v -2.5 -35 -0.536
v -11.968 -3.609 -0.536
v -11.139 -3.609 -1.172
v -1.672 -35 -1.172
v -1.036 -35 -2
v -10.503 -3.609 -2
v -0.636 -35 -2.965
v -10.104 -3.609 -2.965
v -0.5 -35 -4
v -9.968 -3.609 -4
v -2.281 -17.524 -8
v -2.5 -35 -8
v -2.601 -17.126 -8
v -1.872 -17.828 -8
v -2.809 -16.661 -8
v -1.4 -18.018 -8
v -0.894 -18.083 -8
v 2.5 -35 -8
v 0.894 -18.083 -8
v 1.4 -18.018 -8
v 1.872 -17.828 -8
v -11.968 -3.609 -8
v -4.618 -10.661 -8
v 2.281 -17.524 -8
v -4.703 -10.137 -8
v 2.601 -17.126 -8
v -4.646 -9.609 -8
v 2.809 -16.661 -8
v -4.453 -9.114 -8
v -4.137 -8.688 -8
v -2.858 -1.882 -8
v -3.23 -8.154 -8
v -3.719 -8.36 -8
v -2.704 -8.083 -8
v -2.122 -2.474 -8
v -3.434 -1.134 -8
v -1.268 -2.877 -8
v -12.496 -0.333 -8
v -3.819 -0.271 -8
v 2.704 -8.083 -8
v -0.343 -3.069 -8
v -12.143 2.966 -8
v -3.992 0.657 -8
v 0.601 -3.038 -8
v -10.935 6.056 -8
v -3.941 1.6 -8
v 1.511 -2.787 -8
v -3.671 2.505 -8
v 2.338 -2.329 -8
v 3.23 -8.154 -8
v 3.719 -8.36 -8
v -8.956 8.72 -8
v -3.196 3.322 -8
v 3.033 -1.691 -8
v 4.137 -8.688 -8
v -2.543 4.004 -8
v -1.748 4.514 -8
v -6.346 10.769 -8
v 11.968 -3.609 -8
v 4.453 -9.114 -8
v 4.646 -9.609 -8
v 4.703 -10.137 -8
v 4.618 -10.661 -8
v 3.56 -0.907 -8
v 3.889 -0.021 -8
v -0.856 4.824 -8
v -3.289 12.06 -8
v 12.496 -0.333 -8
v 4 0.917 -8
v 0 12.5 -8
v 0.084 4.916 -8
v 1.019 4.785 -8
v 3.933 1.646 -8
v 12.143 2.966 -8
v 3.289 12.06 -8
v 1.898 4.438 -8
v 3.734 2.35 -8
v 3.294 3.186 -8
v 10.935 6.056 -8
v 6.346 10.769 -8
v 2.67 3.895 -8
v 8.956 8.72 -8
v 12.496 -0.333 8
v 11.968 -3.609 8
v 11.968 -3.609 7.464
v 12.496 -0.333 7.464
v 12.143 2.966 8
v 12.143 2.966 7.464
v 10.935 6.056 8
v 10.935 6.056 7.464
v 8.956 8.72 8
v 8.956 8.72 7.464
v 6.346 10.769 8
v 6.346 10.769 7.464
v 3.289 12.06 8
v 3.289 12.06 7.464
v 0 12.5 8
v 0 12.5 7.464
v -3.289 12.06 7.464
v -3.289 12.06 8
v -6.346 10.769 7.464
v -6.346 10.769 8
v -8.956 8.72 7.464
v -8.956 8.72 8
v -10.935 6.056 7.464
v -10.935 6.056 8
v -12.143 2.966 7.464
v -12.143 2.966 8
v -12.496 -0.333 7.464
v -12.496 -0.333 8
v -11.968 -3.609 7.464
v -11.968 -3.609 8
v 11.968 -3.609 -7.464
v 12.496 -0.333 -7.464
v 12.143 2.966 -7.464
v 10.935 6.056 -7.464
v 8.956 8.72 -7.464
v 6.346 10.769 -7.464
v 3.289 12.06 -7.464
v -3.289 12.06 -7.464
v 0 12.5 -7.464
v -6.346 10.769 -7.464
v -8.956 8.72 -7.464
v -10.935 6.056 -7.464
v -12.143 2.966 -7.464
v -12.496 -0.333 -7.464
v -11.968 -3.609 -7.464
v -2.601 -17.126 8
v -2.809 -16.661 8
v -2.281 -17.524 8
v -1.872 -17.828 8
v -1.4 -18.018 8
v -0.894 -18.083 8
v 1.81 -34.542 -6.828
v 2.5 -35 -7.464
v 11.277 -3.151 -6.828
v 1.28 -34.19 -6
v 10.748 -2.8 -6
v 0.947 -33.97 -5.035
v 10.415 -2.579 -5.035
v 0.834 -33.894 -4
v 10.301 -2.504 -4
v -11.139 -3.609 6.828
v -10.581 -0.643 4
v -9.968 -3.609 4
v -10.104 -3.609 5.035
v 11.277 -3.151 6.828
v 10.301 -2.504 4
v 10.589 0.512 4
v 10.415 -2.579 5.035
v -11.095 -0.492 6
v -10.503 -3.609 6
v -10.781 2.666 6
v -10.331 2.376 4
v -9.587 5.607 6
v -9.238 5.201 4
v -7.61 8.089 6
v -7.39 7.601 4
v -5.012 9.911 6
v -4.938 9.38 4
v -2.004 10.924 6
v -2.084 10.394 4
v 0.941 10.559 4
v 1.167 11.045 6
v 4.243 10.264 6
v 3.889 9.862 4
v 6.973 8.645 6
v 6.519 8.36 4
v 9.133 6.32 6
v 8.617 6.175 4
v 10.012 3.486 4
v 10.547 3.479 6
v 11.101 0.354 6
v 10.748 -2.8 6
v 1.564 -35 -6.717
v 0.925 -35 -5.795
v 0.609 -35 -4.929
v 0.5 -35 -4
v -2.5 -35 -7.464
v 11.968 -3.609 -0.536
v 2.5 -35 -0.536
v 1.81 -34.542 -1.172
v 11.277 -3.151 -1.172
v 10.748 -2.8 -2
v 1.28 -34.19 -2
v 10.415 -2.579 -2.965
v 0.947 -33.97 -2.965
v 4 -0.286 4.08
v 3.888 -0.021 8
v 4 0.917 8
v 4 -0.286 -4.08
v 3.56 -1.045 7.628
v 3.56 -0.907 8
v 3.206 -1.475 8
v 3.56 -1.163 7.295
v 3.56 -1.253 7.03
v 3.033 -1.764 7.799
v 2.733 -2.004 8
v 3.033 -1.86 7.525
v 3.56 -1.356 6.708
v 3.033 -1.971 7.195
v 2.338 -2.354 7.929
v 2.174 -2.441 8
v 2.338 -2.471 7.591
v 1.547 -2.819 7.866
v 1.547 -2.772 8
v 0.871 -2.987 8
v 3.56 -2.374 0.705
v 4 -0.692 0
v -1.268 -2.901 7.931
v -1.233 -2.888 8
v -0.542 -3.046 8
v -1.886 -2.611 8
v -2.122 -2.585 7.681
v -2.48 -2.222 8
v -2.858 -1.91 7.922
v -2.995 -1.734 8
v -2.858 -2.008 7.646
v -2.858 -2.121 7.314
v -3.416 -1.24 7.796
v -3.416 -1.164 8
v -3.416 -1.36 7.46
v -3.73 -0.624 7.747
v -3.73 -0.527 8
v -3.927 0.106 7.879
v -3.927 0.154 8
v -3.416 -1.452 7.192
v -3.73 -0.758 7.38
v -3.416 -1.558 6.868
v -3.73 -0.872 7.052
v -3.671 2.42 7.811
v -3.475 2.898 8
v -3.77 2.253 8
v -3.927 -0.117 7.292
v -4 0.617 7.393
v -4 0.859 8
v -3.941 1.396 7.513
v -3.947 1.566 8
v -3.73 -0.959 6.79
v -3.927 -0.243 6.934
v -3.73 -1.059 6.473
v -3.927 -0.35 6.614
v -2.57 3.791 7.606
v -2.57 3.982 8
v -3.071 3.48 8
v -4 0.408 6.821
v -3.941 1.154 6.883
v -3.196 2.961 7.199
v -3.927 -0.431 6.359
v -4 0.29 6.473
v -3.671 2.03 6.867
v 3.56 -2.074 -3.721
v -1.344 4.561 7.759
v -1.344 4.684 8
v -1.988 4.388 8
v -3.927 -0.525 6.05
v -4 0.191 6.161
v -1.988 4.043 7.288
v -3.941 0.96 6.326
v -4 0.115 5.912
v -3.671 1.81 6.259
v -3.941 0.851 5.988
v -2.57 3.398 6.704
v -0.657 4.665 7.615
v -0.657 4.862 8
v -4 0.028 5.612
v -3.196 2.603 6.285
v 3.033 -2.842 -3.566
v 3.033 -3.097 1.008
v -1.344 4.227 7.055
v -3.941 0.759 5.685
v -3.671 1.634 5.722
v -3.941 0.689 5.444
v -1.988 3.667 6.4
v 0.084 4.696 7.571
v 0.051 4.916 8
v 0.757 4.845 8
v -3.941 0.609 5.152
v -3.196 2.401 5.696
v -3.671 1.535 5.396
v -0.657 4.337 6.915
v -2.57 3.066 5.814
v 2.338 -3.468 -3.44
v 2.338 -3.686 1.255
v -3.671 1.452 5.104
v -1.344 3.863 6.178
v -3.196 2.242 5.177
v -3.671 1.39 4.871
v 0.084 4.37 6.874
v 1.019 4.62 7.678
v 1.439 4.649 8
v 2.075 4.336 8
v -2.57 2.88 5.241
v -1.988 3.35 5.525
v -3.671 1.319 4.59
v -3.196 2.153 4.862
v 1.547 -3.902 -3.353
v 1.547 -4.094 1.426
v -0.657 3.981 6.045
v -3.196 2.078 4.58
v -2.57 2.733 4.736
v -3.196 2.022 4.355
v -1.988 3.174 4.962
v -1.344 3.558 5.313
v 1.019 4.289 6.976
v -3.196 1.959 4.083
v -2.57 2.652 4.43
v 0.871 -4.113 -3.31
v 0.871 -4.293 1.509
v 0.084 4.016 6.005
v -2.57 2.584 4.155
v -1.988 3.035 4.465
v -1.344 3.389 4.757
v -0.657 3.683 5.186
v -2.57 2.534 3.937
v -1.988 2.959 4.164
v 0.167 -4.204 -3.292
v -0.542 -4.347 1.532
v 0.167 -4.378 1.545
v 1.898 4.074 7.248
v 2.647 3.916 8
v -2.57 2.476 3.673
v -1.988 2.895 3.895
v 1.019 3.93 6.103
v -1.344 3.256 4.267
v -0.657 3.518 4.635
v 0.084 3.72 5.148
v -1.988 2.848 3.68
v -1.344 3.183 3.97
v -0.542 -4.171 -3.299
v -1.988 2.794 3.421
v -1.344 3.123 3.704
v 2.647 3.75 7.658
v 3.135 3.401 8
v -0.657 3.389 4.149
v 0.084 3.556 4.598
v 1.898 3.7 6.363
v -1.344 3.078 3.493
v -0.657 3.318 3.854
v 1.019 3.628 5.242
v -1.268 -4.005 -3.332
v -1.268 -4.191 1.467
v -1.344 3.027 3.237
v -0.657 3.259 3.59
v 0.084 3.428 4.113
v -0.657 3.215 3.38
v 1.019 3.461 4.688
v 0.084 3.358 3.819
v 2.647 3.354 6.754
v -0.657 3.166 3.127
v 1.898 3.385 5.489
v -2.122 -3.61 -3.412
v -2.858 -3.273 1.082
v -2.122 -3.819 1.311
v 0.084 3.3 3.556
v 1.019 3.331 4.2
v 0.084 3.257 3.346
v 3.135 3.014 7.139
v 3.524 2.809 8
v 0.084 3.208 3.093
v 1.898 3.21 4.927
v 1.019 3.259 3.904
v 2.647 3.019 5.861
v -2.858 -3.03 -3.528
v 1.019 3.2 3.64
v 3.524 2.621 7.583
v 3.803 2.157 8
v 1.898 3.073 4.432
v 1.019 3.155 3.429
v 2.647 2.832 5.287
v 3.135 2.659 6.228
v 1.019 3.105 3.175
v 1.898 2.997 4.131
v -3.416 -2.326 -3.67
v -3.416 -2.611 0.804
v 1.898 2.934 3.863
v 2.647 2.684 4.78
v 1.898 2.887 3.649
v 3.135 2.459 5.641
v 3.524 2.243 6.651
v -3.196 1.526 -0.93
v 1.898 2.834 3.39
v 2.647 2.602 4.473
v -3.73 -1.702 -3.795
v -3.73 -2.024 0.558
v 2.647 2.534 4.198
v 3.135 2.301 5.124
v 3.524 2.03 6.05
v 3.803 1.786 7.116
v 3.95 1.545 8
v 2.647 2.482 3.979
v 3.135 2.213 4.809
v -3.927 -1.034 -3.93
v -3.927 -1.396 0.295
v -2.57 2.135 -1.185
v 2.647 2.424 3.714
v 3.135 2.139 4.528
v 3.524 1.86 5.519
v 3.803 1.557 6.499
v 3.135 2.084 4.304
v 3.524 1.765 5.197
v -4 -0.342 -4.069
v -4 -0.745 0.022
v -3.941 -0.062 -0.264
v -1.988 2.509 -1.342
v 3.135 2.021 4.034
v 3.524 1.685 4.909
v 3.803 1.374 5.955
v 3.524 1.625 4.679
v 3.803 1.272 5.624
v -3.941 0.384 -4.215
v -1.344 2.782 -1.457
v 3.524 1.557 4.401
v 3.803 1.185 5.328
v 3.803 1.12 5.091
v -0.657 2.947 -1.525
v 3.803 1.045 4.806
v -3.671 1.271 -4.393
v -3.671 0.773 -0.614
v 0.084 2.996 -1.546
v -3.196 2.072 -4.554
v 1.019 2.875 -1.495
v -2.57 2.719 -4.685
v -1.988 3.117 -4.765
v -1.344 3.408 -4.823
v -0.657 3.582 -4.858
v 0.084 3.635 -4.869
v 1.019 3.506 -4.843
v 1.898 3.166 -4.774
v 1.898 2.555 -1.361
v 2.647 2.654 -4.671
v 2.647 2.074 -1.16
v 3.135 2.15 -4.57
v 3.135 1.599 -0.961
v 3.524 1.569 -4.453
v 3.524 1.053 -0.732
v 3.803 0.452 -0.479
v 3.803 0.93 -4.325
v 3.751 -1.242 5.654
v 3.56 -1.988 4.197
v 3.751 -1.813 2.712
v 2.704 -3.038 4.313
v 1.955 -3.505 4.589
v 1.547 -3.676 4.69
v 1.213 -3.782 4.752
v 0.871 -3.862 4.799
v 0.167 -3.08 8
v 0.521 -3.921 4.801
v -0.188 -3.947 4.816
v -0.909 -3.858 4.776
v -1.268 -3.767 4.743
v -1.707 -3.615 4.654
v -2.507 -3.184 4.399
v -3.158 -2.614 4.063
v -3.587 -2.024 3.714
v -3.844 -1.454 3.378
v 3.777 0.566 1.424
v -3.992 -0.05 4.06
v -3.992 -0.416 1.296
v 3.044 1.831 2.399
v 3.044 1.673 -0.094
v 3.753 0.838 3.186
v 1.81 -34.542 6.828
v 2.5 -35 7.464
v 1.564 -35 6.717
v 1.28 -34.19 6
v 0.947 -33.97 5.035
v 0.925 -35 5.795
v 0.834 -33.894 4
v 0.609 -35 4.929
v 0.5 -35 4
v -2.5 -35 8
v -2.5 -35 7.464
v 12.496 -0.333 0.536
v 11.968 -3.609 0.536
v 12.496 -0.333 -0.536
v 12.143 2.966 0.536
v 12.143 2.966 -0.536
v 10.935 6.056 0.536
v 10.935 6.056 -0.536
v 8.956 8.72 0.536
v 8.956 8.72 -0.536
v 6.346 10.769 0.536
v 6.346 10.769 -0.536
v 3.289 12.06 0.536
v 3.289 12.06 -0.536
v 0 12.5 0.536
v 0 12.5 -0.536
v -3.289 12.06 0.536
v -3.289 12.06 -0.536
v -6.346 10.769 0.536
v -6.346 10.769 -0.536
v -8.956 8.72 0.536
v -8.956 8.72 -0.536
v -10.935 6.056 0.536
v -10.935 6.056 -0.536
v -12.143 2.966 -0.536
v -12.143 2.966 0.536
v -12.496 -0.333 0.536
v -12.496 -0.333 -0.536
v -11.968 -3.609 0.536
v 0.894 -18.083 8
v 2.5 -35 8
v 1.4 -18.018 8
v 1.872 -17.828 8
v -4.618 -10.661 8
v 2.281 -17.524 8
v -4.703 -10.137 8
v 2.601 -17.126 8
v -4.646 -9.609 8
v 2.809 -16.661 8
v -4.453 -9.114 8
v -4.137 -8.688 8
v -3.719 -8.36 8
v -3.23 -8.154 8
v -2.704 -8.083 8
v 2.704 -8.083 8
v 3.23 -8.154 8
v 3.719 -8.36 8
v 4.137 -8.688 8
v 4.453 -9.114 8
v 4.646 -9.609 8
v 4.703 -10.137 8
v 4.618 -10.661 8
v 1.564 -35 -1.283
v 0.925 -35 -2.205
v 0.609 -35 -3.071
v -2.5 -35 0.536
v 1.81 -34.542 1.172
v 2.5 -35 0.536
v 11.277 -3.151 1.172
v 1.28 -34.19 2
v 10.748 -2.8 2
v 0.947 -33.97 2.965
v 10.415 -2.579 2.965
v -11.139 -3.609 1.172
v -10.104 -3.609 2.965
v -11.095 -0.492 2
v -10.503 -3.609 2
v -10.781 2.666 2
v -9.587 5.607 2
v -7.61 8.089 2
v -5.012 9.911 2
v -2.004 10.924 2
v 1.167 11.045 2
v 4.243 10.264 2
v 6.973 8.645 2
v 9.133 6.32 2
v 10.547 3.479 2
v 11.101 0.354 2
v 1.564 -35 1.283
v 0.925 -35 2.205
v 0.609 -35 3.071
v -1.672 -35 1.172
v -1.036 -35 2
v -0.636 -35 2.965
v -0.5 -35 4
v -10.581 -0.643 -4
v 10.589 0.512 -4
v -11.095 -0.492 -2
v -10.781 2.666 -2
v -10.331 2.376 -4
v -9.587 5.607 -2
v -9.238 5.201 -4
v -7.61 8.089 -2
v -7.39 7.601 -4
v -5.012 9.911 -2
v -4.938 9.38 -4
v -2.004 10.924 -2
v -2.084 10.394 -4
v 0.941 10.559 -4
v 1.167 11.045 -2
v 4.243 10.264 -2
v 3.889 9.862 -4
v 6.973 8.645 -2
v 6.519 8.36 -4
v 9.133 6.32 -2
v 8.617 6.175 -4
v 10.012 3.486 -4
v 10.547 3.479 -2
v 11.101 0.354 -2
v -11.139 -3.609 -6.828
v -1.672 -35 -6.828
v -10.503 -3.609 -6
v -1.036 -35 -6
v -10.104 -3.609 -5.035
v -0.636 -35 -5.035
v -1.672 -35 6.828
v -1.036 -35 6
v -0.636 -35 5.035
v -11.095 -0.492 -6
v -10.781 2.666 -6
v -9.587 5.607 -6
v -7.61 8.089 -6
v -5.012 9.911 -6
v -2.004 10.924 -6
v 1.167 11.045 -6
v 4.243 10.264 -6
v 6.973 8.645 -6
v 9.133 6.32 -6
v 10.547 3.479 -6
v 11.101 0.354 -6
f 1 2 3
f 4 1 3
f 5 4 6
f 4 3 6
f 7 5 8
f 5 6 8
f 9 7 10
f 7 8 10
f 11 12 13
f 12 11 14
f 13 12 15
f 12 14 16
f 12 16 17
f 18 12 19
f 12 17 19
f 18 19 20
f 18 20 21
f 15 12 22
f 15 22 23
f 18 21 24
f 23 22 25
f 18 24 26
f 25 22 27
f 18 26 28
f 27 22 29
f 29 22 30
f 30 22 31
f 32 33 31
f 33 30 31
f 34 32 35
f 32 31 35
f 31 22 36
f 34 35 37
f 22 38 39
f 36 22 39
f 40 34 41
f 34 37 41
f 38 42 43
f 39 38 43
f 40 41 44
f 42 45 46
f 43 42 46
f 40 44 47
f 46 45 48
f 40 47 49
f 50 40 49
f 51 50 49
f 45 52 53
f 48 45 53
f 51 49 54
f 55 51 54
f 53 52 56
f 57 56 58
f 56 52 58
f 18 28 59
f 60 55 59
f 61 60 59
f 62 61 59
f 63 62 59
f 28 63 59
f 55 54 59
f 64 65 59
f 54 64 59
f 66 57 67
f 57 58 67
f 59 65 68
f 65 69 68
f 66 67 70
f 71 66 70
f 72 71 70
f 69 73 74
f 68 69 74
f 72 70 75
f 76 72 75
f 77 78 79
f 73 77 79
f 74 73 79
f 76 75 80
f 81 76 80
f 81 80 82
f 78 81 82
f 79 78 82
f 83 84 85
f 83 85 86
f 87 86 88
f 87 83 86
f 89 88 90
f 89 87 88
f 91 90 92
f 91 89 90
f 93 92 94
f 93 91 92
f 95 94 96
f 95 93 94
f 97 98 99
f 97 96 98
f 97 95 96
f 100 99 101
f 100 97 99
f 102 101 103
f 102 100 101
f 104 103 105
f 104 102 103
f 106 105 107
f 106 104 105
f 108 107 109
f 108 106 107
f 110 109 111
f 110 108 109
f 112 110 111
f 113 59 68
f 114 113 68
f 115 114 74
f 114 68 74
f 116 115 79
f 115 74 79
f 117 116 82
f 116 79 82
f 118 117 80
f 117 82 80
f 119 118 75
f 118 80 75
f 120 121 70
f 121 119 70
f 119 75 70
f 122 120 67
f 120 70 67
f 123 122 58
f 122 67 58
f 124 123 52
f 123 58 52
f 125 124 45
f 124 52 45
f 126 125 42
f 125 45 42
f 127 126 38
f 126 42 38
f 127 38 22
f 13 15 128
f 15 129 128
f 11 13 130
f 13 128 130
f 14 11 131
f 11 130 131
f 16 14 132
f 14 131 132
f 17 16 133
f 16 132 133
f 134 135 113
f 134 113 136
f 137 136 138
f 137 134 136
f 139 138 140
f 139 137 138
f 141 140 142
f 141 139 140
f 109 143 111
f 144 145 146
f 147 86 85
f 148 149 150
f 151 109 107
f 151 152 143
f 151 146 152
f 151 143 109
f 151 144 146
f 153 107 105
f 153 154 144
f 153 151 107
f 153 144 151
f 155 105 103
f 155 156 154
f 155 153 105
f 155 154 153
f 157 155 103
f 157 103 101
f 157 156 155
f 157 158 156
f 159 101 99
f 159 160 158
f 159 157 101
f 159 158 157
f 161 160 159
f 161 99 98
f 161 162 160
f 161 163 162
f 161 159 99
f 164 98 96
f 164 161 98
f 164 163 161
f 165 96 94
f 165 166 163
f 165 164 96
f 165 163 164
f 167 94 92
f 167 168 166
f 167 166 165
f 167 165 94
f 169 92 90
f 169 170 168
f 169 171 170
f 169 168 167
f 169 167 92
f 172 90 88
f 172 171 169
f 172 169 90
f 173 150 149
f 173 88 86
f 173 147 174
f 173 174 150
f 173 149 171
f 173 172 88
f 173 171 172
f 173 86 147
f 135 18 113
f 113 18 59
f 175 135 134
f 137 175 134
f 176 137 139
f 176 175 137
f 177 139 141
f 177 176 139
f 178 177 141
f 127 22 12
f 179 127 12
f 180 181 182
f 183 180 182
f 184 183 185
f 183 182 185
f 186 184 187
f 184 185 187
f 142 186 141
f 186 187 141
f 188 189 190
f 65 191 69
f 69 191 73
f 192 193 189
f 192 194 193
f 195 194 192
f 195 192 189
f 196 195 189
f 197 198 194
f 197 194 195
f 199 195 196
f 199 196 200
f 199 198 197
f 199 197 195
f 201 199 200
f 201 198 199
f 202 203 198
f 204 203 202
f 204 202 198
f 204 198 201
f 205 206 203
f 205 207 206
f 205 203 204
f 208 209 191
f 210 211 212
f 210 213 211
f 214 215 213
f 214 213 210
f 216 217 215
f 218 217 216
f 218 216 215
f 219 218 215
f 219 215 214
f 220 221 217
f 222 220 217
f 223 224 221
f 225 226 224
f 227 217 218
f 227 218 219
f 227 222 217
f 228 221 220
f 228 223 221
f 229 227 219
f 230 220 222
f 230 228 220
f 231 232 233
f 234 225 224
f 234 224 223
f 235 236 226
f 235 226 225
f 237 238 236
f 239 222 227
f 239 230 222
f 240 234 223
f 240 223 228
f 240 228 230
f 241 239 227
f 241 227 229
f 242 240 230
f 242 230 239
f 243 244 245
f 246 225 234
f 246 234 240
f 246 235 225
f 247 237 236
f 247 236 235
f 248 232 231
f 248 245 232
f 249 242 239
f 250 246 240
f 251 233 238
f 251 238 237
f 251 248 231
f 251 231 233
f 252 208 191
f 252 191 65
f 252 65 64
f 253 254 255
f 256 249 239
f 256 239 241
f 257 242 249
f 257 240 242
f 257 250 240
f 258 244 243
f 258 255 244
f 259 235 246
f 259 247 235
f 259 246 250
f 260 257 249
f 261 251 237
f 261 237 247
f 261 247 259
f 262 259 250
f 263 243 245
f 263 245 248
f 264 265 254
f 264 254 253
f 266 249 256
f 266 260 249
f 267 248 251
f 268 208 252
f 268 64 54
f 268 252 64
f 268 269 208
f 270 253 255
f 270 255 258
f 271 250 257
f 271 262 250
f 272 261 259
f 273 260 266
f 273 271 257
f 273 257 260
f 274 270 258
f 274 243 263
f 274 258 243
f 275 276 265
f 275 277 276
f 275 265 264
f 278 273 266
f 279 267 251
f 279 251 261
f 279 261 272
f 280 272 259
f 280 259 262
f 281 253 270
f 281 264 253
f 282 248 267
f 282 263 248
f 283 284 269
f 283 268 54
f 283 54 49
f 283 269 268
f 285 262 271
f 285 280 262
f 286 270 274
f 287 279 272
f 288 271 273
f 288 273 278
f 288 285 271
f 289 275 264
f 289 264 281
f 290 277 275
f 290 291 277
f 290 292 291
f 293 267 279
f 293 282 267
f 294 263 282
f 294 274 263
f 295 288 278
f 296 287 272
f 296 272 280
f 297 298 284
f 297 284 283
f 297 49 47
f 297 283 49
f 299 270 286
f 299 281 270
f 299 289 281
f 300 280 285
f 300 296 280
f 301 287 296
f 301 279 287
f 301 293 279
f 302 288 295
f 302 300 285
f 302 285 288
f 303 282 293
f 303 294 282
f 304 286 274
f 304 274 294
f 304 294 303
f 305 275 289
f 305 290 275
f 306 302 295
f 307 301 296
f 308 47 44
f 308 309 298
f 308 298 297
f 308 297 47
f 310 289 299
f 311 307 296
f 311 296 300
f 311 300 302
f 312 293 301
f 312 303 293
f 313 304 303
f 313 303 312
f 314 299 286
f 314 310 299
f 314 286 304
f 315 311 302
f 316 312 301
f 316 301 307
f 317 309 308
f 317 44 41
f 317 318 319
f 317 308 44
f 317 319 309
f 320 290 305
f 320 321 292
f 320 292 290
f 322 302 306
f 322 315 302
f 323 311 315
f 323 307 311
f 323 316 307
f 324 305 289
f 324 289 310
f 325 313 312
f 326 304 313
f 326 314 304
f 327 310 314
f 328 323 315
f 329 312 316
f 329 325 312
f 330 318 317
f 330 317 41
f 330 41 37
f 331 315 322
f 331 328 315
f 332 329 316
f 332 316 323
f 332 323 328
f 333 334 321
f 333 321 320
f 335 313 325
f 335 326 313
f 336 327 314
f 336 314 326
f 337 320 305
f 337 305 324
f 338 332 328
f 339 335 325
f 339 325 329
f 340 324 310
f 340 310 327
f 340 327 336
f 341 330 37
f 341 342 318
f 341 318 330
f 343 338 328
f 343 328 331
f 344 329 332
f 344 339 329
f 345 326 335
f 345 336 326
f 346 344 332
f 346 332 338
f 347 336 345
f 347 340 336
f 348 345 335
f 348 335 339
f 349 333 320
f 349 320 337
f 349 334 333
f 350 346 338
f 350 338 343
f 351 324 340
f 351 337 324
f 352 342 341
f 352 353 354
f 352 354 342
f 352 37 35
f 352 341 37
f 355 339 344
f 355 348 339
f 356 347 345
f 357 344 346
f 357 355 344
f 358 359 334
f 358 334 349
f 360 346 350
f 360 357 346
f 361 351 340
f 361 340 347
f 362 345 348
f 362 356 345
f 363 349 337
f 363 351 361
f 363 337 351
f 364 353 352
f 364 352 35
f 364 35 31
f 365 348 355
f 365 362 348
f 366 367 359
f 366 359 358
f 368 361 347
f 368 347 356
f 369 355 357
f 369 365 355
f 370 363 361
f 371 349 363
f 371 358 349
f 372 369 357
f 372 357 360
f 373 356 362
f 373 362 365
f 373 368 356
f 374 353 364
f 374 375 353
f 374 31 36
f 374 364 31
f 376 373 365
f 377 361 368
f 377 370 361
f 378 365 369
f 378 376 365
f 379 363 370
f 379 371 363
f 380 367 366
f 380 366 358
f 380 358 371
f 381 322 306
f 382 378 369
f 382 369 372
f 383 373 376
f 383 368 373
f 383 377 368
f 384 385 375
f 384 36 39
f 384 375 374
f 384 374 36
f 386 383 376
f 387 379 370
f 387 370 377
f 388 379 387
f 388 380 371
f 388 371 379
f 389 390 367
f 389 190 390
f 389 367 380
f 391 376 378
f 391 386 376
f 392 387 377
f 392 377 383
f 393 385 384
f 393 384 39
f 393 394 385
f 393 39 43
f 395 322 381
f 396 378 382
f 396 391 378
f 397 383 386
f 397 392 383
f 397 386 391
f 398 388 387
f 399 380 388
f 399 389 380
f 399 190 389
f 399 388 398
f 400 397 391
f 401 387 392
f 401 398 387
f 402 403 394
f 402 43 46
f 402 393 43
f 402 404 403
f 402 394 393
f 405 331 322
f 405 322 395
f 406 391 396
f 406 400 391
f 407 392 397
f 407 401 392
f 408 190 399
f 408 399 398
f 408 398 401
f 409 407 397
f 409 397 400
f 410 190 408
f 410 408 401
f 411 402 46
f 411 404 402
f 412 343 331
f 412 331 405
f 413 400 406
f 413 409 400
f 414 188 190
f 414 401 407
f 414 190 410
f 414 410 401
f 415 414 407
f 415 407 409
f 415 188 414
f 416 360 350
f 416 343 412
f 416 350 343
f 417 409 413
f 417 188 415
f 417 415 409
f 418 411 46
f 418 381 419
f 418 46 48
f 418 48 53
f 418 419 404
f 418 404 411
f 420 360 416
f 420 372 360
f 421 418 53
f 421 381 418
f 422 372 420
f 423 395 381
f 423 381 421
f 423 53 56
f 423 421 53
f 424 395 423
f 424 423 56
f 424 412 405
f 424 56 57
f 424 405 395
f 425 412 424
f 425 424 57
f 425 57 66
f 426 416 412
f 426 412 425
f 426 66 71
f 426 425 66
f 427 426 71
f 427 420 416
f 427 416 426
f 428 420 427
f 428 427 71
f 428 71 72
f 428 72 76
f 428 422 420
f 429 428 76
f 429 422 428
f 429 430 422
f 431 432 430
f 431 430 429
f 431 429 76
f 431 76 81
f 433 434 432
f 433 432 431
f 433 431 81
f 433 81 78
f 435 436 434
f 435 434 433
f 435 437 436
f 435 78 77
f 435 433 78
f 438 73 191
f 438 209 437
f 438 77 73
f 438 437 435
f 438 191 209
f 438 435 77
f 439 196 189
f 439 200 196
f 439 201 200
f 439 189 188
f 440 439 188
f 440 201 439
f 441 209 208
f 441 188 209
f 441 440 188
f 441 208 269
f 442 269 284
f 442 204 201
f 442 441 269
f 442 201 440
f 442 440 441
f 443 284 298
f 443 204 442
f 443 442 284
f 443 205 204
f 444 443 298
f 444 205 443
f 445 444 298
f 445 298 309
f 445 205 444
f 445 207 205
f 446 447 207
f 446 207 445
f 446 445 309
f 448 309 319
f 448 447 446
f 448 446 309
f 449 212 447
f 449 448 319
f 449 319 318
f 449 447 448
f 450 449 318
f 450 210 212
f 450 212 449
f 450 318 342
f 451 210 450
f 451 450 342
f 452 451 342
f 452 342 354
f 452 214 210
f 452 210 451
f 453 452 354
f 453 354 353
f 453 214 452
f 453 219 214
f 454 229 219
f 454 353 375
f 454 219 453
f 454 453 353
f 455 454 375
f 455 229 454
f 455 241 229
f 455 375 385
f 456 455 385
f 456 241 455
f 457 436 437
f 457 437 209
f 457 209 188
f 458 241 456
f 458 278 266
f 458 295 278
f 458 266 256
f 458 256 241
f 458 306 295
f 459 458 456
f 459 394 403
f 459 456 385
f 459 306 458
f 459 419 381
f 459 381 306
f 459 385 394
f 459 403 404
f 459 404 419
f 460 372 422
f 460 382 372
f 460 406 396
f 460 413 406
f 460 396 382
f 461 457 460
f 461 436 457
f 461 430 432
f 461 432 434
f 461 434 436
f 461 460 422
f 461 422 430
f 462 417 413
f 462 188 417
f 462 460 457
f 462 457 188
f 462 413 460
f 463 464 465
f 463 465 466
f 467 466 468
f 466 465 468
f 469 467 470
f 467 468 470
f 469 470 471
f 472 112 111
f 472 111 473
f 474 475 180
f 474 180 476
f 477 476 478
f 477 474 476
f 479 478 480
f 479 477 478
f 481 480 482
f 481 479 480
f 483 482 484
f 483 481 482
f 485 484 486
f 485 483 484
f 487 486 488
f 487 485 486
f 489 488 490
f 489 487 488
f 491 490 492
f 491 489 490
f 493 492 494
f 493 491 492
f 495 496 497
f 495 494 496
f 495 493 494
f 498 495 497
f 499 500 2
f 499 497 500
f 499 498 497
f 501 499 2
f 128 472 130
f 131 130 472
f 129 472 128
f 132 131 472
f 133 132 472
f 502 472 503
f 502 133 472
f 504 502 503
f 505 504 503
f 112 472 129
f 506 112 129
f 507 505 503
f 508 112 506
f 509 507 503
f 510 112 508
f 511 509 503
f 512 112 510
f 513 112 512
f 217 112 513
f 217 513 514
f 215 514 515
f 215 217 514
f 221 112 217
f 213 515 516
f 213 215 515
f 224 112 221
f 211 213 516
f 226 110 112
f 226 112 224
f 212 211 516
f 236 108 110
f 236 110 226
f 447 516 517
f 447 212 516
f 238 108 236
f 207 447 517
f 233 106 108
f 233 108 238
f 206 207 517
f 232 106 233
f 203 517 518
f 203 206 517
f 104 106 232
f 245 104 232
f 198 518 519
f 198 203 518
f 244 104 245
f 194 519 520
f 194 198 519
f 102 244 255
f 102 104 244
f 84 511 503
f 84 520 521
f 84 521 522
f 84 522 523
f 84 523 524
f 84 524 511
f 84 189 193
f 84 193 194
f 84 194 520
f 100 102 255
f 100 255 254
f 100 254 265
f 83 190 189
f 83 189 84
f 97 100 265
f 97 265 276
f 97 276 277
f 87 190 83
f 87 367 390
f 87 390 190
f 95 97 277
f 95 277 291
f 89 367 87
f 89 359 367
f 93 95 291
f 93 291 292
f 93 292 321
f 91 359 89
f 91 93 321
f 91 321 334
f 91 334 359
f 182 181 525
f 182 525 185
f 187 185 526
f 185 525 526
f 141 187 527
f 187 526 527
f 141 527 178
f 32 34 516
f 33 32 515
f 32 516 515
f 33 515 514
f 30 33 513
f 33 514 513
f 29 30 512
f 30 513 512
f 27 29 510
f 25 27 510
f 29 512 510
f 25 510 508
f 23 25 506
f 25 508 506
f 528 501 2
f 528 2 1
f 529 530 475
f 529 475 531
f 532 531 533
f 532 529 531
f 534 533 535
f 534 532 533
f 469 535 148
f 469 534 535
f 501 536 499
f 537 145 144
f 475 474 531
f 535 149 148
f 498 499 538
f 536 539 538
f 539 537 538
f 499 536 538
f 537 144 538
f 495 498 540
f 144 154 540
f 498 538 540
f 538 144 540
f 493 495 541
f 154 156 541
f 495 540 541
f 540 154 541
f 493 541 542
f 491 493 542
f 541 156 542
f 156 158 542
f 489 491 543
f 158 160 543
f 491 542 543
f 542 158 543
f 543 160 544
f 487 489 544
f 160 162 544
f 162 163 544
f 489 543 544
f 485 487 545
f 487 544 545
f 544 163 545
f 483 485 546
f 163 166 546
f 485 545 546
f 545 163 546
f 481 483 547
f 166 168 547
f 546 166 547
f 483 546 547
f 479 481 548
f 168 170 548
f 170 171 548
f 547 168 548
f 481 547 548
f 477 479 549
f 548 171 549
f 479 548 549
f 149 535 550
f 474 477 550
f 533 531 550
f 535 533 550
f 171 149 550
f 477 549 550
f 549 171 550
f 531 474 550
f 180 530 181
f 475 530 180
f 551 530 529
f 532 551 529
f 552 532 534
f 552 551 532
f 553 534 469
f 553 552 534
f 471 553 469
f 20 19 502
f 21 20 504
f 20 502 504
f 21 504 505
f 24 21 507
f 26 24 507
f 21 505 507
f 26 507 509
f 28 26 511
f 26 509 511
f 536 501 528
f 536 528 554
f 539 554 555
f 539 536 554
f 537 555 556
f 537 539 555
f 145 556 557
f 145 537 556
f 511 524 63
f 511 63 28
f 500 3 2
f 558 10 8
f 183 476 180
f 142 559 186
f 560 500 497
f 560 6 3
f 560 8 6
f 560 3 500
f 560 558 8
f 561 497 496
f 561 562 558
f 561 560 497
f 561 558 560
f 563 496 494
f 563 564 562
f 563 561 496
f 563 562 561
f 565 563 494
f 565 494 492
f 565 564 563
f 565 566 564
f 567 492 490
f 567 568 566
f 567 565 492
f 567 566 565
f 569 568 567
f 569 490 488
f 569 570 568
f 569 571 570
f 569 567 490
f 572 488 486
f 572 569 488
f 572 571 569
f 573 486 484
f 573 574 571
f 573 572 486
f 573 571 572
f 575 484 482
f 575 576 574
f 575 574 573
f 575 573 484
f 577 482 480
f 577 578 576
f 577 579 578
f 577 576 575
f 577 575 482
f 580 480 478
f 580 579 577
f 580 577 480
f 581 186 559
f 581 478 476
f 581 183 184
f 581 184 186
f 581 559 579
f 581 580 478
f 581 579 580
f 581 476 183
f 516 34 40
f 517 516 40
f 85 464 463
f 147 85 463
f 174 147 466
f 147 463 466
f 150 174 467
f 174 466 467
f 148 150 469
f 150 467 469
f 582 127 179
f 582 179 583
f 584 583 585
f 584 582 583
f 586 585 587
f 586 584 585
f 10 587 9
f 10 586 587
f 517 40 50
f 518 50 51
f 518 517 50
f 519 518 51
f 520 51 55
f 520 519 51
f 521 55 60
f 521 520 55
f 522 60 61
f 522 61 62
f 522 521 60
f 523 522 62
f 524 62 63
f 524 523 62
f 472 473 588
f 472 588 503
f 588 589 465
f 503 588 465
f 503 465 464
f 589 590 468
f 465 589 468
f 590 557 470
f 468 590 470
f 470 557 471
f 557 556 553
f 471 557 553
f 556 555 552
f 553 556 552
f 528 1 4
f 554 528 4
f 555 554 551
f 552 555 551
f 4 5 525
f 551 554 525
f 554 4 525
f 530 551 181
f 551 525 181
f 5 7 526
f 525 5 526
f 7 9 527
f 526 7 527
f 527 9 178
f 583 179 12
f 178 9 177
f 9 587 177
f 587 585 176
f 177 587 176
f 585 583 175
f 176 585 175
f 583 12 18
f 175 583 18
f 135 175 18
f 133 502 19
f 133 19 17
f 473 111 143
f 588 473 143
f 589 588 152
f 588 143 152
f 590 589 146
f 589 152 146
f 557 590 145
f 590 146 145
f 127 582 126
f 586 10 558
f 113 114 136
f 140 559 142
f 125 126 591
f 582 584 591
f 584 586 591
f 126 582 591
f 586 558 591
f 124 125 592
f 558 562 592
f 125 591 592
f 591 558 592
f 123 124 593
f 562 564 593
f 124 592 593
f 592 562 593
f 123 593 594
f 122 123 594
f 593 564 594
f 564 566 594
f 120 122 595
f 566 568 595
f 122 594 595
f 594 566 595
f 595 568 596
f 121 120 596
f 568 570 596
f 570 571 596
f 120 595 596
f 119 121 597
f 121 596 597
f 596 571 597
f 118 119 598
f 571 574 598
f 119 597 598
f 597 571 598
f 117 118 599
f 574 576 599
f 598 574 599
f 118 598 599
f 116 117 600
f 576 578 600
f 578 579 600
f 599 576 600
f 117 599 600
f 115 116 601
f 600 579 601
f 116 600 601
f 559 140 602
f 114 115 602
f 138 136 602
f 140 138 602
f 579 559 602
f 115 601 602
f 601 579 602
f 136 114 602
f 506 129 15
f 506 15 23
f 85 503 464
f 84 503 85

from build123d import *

# Parameters (mm, degrees)
F1_DEPTH  = 4
F8_R      = 4
F11_DEPTH = 16
F12_R     = 2


with BuildPart() as f1:
    # F0 (on Top) → F1 (new body)
    with BuildSketch(Plane.XY):
        with BuildLine():
            Line((2.5, -35), (11.9675303731, -3.6094621162))
            ThreePointArc((11.9675303731, -3.6094621162), (0, 12.5), (-11.9675303731, -3.6094621162))
            Line((-11.9675303731, -3.6094621162), (-2.5, -35))
            Line((-2.5, -35), (2.5, -35))
        make_face()
    extrude(amount=F1_DEPTH)

    # F4: sweep along a path in F4_path
    with BuildLine(Plane(origin=(-11.9675303731, -3.6094621162, 4), x_dir=(0, 1, 0), z_dir=(0, 0, 1))) as f4_path:
        Line((-31.3905378838, -9.4675303731), (0, 0))
        ThreePointArc((0, 0), (16.1094621162, -11.9675303731), (0, -23.9350607463))
        Line((0, -23.9350607463), (-31.3905378838, -14.4675303731))
        Line((-31.3905378838, -14.4675303731), (-38.5466098599, -12.309226204))
    # F3 (on face) → F4 (sweep, cut)
    with BuildSketch(Plane.XZ.offset(35)):
        with BuildLine():
            ThreePointArc((-2.5, 0.5358983849), (-1.0358983849, 2), (-0.5, 4))
            Line((-0.5, 4), (-2.5, 4))
            Line((-2.5, 4), (-2.5, 0.5358983849))
        make_face()
    sweep(path=f4_path.line, mode=Mode.SUBTRACT)

    # F5: F1 across face


with BuildPart() as f1_1:
    add(f1.part)
    add(f1.part.mirror(Plane(origin=(-0.0002119215, -7.1160026753, 4), x_dir=(1, 0, 0), z_dir=(0, 0, 1))))

    # F6: F1 across face


with BuildPart() as f1_2:
    add(f1_1.part)
    add(f1_1.part.mirror(Plane(origin=(0, -7.6972152999, 0), x_dir=(1, 0, 0), z_dir=(0, 0, -1))))

    # F9: sweep along a path in F7
    with BuildLine(Plane.YZ) as f9_path:
        CenterArc((20, 0), 20, 0, 360)
    # F8 (on face) → F9 (sweep, cut)
    with BuildSketch(Plane(origin=(0, 0, -8), x_dir=(1, 0, 0), z_dir=(0, 0, -1))):
        with Locations((0, -0.9167455137)):
            Circle(F8_R)
    sweep(path=f9_path.line, mode=Mode.SUBTRACT)

    # F10 (on face) → F11 (cut, through all)
    with BuildSketch(Plane(origin=(0, 0, -8), x_dir=(1, 0, 0), z_dir=(0, 0, -1))):
        Polygon((5.3957497615, 8.0832544863), (2.3797038408, 18.0832544863), (-2.3797038408, 18.0832544863), (-5.3957497615, 8.0832544863), align=None)
    extrude(amount=-F11_DEPTH, mode=Mode.SUBTRACT)

    # F12
    f12_edges = [f1_2.edges().sort_by_distance(p)[0] for p in [
        (-5.39575, -8.083254, 0),
        (5.39575, -8.083254, 0),
        (-2.379704, -18.083254, 0),
        (2.379704, -18.083254, 0),
    ]]
    fillet(f12_edges, radius=F12_R)


solid = f1_2.part
